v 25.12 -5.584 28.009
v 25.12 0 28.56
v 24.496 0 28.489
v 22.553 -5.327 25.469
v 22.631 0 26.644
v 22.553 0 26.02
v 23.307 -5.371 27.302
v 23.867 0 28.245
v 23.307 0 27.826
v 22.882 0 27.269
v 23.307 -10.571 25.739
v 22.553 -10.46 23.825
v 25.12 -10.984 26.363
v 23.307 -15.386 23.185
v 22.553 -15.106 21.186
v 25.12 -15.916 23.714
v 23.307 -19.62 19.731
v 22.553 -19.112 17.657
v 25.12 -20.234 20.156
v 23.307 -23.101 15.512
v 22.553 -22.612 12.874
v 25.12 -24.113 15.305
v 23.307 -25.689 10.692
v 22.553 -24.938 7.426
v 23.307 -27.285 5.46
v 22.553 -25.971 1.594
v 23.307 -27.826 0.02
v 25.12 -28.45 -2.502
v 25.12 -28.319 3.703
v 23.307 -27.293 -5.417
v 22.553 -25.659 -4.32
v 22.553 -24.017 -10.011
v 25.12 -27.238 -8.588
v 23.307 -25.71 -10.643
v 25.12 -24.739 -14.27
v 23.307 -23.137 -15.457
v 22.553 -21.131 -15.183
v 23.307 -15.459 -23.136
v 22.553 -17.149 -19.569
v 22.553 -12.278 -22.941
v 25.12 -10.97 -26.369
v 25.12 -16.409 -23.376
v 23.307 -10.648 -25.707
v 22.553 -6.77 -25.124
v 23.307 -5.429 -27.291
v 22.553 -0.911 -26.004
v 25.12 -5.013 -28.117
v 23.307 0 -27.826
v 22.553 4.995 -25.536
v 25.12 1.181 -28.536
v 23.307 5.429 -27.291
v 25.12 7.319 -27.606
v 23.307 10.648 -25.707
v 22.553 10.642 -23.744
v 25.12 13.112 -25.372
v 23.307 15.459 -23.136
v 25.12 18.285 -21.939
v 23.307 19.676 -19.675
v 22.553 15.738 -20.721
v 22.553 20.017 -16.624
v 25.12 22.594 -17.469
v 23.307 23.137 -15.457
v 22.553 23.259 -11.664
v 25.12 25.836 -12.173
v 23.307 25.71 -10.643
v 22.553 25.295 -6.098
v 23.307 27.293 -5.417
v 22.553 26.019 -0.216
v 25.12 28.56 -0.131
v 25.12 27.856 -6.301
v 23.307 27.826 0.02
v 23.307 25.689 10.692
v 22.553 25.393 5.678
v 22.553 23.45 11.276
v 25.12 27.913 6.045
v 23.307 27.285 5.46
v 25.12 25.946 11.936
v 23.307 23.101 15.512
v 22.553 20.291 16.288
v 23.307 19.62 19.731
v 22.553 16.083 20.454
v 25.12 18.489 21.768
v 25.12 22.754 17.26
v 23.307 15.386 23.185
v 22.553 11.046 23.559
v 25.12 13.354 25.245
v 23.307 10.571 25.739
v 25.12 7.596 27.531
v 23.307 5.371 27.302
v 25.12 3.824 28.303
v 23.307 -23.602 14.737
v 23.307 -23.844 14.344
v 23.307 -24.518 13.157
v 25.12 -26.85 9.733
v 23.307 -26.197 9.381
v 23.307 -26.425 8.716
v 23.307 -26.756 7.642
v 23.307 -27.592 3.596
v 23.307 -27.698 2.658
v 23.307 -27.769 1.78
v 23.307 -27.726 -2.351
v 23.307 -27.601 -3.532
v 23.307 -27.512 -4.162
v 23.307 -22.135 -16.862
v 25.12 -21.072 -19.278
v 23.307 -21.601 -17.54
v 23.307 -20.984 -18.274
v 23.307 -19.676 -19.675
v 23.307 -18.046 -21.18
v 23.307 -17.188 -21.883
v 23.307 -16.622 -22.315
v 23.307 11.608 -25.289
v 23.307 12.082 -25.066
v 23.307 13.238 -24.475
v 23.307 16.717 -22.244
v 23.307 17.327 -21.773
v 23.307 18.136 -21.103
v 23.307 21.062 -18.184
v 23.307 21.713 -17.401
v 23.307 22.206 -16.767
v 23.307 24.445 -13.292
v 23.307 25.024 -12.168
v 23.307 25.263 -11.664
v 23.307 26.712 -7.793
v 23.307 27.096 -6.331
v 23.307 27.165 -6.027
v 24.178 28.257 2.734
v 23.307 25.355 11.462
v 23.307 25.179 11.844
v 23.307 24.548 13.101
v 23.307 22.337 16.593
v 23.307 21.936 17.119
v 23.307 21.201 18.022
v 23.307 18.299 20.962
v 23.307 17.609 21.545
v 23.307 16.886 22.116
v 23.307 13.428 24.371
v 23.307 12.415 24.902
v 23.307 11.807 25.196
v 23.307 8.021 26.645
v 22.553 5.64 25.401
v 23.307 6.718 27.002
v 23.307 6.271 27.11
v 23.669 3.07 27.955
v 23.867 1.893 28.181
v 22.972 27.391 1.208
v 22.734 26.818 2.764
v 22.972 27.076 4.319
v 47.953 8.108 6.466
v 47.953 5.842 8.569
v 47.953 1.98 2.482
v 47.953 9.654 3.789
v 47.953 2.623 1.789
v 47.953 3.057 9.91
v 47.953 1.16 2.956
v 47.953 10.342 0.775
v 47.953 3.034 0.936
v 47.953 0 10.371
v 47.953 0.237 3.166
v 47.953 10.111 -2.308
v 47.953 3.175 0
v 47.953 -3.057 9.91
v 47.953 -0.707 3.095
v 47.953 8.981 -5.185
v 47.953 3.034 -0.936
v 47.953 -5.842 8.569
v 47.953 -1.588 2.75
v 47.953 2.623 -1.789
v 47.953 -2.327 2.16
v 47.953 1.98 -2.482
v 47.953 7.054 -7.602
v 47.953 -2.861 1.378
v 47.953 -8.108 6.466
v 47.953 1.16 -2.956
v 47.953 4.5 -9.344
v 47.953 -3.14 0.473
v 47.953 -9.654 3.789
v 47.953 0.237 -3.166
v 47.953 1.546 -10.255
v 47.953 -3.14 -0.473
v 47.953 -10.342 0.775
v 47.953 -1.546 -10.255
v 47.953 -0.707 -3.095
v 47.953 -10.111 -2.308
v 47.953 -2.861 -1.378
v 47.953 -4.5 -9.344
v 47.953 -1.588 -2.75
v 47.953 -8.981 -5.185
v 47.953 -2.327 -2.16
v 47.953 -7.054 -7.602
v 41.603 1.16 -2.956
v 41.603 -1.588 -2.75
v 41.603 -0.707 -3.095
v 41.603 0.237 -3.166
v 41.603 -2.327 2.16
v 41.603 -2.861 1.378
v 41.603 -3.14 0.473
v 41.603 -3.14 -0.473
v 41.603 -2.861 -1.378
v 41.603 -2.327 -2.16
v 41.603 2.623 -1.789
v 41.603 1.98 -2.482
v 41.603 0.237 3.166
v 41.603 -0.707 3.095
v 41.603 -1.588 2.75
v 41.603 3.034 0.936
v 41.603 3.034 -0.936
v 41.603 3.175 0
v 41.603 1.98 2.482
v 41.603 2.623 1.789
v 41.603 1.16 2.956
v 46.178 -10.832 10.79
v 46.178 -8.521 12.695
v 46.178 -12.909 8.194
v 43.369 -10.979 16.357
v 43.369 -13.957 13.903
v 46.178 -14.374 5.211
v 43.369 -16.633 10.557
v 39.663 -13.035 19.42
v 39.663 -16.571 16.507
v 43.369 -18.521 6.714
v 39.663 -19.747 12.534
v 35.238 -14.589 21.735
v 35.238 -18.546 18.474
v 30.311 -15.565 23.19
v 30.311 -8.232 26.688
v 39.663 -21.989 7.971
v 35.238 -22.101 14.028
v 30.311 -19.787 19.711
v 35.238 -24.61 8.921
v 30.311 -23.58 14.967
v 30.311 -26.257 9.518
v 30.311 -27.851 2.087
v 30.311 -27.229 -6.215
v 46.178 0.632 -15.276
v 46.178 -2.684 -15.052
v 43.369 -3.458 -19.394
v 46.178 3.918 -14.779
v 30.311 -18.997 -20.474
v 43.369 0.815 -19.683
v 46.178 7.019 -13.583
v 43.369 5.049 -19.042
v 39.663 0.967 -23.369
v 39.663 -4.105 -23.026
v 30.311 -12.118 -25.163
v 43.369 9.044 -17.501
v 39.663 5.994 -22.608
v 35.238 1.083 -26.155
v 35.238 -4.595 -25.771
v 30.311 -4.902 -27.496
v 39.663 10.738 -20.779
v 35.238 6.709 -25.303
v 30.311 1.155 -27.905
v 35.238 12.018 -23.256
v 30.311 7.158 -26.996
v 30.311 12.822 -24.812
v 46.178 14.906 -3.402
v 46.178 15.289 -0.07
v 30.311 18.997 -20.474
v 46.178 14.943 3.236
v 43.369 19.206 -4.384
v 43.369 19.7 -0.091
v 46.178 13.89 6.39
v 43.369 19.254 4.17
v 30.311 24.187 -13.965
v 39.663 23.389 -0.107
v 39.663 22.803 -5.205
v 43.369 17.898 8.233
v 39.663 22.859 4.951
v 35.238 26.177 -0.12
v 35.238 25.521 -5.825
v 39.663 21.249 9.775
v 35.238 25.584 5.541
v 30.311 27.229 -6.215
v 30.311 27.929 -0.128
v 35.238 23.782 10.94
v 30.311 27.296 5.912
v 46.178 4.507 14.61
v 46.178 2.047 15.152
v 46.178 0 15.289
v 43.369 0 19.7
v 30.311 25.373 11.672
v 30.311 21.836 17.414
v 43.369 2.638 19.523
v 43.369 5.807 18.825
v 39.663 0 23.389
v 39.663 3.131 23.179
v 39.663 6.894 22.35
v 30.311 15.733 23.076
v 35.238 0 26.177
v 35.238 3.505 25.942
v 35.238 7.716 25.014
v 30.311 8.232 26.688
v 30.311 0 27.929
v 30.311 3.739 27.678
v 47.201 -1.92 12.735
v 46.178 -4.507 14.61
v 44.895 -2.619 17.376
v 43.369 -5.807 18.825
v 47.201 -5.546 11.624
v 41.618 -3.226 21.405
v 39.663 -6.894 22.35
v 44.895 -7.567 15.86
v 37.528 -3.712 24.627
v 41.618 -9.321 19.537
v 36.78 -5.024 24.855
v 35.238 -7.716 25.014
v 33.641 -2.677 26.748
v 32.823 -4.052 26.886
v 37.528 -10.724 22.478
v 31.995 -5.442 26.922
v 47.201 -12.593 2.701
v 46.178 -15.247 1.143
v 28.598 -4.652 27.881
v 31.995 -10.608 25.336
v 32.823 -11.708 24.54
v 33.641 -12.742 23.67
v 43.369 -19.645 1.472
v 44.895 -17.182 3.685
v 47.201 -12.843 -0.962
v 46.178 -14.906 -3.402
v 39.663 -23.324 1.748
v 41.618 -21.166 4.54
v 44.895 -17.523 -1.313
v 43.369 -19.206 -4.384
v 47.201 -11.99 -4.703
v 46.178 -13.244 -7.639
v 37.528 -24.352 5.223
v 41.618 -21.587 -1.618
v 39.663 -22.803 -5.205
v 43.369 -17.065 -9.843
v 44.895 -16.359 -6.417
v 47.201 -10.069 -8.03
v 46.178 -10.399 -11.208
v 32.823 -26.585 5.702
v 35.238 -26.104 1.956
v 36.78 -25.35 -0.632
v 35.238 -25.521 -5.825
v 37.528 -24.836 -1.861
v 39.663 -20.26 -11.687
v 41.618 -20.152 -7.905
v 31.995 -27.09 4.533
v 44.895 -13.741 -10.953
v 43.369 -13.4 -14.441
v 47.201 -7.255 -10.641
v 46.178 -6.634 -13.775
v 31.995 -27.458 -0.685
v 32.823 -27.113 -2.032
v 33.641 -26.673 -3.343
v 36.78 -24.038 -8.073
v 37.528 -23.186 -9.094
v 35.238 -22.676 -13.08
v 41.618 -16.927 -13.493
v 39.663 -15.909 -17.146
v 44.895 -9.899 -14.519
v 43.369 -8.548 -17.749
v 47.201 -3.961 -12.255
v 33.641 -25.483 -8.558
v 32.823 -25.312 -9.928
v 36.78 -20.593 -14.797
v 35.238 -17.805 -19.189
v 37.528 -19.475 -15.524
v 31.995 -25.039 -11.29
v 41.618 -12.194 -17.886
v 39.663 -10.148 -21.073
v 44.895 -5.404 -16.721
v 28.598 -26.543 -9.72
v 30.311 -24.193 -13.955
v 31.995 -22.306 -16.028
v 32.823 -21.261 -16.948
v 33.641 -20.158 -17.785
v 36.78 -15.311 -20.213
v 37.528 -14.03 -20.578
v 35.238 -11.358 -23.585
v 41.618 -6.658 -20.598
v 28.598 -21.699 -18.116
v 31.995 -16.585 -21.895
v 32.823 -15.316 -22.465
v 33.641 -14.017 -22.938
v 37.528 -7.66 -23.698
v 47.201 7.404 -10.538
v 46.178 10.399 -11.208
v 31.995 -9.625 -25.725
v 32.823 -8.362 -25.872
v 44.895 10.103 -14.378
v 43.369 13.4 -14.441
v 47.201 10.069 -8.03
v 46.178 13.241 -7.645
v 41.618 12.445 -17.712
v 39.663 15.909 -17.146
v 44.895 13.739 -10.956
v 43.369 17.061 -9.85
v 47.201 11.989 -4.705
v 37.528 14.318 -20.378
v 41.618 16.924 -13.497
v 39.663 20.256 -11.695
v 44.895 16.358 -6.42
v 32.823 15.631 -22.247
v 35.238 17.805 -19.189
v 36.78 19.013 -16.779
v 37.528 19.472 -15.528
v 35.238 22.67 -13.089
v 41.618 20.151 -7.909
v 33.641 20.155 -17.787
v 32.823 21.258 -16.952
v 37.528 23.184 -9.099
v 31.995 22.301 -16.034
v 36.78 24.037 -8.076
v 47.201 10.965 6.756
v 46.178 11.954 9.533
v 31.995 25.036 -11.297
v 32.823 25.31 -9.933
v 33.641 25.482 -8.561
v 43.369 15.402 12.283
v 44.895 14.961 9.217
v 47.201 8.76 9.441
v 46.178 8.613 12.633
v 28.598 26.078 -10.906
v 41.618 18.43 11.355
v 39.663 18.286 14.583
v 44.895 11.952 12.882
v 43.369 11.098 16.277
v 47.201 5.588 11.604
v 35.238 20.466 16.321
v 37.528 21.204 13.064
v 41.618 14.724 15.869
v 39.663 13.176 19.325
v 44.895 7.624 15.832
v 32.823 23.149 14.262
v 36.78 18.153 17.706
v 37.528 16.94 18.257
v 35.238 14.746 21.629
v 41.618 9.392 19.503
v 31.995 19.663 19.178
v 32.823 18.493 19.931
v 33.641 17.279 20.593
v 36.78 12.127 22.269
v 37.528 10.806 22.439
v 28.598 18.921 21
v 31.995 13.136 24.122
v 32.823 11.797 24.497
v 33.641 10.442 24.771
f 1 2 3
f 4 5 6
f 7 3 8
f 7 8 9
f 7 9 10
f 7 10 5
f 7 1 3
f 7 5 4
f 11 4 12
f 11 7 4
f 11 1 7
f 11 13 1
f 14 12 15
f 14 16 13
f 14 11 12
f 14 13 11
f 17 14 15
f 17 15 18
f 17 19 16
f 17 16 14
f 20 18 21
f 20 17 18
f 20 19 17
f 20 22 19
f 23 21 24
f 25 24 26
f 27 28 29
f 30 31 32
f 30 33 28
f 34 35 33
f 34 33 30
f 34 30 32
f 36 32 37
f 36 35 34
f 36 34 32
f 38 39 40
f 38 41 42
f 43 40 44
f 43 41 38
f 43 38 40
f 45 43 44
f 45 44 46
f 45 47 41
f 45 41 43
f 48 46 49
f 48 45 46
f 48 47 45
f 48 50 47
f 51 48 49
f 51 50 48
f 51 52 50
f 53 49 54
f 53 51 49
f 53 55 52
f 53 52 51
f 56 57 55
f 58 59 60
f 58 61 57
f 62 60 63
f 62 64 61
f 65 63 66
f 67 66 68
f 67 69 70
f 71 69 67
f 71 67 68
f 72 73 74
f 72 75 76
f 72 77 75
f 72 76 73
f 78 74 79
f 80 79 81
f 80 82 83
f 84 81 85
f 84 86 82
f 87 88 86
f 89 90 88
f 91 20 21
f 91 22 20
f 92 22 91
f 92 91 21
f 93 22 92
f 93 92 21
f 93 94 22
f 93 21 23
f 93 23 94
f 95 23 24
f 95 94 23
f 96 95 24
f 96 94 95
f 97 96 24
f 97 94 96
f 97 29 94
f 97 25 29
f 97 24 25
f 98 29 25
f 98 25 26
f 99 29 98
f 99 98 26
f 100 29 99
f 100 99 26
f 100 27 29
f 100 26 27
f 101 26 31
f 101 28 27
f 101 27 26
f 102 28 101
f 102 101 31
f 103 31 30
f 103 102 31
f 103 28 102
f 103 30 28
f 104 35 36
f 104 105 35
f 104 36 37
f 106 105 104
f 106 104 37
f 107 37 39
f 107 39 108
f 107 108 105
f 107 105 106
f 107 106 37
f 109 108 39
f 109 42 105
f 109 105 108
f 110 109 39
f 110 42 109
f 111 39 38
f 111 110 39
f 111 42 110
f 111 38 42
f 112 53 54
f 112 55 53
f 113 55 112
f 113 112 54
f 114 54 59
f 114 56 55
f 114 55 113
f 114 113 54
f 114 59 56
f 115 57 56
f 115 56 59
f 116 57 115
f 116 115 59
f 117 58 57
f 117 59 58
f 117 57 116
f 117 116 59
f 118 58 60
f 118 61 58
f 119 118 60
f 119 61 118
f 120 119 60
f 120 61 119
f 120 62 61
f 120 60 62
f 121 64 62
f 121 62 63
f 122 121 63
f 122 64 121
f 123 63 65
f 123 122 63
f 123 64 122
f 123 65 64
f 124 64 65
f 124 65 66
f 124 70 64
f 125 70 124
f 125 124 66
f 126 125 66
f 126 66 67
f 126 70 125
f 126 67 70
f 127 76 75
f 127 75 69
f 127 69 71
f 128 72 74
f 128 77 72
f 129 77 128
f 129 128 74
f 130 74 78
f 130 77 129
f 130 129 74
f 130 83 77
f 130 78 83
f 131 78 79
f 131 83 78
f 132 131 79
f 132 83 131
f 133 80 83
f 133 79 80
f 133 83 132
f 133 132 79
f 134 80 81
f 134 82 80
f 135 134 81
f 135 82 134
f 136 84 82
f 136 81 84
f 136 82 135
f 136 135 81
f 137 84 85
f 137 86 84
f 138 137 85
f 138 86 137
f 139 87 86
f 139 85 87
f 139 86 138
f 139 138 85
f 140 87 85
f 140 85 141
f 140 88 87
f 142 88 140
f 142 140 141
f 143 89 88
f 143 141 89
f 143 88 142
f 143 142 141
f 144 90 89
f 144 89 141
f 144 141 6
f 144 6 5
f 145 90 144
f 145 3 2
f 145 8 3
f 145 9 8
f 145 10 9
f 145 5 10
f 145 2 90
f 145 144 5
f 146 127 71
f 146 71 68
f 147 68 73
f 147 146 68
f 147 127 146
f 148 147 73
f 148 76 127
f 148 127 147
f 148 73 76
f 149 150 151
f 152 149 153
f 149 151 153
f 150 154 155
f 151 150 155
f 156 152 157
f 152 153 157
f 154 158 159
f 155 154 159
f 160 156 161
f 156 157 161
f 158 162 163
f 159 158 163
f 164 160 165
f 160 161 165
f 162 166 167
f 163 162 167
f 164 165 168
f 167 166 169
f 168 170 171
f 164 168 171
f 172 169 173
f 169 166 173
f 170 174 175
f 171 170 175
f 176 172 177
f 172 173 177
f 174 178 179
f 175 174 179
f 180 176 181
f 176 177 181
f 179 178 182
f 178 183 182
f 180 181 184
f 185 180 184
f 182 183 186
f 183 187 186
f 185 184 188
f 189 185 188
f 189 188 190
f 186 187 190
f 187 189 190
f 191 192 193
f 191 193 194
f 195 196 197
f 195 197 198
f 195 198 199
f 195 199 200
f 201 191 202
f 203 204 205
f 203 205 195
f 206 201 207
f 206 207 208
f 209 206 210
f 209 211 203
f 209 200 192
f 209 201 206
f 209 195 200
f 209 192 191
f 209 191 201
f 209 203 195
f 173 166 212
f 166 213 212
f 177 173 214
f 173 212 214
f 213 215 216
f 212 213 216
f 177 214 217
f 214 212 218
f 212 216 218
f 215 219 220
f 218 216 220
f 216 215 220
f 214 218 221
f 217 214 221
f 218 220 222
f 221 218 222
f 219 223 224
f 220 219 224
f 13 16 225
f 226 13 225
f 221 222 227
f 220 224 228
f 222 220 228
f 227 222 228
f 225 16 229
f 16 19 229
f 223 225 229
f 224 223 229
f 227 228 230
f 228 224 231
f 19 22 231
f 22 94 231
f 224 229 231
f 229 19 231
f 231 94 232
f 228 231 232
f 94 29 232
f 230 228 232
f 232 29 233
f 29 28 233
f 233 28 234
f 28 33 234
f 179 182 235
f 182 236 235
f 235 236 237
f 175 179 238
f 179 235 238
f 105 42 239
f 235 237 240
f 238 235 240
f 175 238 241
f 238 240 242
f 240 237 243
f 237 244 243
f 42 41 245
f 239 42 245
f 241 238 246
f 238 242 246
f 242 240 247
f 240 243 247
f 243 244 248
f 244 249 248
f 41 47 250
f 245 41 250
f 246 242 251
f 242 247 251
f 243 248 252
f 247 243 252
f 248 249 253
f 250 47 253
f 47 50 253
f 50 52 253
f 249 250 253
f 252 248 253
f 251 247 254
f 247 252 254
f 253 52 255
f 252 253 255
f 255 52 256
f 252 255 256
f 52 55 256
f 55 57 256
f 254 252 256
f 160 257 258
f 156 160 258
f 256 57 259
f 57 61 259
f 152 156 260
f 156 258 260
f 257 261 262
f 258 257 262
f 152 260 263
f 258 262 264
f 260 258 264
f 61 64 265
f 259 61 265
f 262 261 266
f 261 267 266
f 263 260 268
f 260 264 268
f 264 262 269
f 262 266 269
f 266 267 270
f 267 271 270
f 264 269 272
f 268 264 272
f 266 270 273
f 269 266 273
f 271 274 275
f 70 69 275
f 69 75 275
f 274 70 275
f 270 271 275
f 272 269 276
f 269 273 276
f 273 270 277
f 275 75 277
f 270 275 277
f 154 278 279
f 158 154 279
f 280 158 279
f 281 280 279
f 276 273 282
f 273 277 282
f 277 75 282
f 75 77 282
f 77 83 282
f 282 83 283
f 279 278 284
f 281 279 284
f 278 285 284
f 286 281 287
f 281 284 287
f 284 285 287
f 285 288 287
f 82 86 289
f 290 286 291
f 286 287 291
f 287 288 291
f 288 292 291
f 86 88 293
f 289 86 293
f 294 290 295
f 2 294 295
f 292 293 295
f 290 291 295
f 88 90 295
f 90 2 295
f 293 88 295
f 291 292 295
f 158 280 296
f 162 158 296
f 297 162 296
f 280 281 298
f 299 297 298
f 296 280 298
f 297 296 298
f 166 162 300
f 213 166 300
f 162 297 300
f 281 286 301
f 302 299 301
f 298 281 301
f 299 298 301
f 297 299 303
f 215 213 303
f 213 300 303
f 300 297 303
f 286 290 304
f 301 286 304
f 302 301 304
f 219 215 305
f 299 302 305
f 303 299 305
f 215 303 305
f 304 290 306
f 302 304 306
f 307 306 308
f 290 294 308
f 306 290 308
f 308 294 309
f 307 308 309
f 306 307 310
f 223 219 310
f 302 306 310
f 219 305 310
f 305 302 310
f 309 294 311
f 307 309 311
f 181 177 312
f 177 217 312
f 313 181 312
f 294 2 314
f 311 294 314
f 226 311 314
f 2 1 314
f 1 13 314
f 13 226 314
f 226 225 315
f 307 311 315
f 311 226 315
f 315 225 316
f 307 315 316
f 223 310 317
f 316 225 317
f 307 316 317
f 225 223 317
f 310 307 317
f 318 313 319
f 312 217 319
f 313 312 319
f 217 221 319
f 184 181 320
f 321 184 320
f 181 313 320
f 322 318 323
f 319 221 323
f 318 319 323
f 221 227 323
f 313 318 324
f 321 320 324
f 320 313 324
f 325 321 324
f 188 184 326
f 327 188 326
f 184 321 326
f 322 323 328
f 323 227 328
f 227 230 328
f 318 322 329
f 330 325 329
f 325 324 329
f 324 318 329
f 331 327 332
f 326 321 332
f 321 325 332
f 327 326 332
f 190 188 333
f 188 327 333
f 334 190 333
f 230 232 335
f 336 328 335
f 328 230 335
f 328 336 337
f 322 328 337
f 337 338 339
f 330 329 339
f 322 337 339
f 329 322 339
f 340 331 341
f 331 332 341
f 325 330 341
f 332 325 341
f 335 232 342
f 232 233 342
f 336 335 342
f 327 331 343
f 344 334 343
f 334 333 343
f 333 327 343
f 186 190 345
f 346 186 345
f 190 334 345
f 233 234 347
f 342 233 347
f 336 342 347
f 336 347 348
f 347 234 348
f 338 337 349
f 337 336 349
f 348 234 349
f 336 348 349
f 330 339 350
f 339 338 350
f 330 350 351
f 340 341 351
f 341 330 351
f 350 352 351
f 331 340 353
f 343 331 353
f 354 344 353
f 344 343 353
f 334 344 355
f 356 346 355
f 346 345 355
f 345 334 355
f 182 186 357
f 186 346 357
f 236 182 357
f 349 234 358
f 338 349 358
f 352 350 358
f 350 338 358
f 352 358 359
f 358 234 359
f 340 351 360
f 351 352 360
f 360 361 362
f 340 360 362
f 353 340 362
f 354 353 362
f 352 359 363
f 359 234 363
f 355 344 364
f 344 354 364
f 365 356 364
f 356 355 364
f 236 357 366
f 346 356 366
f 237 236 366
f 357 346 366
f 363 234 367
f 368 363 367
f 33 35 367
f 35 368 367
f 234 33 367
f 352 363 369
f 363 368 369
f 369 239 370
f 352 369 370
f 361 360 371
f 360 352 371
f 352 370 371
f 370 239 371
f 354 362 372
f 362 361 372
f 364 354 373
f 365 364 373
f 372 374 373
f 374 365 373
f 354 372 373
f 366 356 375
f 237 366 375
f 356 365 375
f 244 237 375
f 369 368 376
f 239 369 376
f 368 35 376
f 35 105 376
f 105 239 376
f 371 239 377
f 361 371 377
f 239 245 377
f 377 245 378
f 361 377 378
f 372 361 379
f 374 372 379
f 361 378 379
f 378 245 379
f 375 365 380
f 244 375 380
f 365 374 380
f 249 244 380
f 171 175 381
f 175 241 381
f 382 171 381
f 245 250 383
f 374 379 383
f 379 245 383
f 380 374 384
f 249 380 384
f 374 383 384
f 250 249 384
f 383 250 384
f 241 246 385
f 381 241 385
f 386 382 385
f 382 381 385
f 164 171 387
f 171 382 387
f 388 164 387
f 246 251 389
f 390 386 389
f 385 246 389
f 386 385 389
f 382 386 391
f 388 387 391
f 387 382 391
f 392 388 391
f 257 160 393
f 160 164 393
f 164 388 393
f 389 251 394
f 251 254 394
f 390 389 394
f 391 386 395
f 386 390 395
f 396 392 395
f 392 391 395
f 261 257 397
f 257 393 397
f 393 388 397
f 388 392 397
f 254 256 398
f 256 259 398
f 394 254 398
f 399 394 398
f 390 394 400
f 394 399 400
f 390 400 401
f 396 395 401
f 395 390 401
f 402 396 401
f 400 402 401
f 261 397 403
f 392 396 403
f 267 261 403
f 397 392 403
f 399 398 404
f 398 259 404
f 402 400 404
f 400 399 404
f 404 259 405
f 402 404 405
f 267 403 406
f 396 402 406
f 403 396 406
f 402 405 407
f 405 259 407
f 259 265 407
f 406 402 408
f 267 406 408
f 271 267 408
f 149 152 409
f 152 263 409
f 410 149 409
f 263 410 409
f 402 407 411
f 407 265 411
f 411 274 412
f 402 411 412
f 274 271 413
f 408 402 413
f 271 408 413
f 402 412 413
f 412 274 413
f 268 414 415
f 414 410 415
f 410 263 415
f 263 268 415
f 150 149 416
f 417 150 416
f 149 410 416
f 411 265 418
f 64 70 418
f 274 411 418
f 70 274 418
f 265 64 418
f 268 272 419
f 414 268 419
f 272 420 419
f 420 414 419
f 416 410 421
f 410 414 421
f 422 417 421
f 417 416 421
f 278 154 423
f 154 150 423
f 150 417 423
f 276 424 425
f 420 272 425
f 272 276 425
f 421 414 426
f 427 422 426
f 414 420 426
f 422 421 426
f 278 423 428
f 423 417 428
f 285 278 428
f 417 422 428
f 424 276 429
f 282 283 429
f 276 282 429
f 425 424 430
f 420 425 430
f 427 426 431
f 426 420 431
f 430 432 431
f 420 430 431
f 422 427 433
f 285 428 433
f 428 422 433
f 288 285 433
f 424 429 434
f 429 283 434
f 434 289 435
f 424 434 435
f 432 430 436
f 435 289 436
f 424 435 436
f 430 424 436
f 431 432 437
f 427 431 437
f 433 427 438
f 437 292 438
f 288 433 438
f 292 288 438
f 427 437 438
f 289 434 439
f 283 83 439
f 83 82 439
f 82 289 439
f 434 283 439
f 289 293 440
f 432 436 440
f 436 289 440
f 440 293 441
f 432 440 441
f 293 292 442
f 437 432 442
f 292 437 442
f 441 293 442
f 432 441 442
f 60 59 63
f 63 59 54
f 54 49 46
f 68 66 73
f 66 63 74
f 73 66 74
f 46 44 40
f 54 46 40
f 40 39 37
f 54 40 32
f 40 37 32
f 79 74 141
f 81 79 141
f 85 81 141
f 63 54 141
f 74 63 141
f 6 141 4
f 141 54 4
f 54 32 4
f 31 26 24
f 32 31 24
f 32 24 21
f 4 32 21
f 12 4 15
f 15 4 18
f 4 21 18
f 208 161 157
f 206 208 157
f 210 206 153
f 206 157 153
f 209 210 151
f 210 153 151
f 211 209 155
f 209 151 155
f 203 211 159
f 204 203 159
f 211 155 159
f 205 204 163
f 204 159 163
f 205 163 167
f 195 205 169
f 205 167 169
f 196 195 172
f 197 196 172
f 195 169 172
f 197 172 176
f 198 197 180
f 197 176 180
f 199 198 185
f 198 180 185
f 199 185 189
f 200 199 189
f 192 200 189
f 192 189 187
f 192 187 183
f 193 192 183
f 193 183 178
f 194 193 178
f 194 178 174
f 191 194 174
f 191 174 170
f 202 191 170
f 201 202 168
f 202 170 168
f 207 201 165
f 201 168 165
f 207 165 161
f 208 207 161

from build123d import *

# Parameters (mm, degrees)
F3_R     = 2.54
F4_R     = 3.175
F5_DEPTH = 6.35


with BuildPart() as f2:
    # F0 (on Front) → F2 (revolve)
    with BuildSketch(Plane.XZ):
        with BuildLine():
            ThreePointArc((47.953237, 10.370561), (38.63617, 24.162526), (22.553237, 28.448))
            Line((22.553237, 28.448), (22.553237, 0))
            Line((22.553237, 0), (47.953237, 0))
            Line((47.953237, 0), (47.953237, 10.370561))
        make_face()
    revolve(axis=Axis((39.286111, 0, 0), (1, 0, 0)))

    # F3
    f3_edges = [f2.edges().sort_by_distance(p)[0] for p in [
        (22.553237, 0, -28.448),
    ]]
    fillet(f3_edges, radius=F3_R)

    # F4 (on face) → F5 (cut)
    with BuildSketch(Plane.YZ.offset(47.953237)):
        Circle(F4_R)
    extrude(amount=-F5_DEPTH, mode=Mode.SUBTRACT)


solid = f2.part
